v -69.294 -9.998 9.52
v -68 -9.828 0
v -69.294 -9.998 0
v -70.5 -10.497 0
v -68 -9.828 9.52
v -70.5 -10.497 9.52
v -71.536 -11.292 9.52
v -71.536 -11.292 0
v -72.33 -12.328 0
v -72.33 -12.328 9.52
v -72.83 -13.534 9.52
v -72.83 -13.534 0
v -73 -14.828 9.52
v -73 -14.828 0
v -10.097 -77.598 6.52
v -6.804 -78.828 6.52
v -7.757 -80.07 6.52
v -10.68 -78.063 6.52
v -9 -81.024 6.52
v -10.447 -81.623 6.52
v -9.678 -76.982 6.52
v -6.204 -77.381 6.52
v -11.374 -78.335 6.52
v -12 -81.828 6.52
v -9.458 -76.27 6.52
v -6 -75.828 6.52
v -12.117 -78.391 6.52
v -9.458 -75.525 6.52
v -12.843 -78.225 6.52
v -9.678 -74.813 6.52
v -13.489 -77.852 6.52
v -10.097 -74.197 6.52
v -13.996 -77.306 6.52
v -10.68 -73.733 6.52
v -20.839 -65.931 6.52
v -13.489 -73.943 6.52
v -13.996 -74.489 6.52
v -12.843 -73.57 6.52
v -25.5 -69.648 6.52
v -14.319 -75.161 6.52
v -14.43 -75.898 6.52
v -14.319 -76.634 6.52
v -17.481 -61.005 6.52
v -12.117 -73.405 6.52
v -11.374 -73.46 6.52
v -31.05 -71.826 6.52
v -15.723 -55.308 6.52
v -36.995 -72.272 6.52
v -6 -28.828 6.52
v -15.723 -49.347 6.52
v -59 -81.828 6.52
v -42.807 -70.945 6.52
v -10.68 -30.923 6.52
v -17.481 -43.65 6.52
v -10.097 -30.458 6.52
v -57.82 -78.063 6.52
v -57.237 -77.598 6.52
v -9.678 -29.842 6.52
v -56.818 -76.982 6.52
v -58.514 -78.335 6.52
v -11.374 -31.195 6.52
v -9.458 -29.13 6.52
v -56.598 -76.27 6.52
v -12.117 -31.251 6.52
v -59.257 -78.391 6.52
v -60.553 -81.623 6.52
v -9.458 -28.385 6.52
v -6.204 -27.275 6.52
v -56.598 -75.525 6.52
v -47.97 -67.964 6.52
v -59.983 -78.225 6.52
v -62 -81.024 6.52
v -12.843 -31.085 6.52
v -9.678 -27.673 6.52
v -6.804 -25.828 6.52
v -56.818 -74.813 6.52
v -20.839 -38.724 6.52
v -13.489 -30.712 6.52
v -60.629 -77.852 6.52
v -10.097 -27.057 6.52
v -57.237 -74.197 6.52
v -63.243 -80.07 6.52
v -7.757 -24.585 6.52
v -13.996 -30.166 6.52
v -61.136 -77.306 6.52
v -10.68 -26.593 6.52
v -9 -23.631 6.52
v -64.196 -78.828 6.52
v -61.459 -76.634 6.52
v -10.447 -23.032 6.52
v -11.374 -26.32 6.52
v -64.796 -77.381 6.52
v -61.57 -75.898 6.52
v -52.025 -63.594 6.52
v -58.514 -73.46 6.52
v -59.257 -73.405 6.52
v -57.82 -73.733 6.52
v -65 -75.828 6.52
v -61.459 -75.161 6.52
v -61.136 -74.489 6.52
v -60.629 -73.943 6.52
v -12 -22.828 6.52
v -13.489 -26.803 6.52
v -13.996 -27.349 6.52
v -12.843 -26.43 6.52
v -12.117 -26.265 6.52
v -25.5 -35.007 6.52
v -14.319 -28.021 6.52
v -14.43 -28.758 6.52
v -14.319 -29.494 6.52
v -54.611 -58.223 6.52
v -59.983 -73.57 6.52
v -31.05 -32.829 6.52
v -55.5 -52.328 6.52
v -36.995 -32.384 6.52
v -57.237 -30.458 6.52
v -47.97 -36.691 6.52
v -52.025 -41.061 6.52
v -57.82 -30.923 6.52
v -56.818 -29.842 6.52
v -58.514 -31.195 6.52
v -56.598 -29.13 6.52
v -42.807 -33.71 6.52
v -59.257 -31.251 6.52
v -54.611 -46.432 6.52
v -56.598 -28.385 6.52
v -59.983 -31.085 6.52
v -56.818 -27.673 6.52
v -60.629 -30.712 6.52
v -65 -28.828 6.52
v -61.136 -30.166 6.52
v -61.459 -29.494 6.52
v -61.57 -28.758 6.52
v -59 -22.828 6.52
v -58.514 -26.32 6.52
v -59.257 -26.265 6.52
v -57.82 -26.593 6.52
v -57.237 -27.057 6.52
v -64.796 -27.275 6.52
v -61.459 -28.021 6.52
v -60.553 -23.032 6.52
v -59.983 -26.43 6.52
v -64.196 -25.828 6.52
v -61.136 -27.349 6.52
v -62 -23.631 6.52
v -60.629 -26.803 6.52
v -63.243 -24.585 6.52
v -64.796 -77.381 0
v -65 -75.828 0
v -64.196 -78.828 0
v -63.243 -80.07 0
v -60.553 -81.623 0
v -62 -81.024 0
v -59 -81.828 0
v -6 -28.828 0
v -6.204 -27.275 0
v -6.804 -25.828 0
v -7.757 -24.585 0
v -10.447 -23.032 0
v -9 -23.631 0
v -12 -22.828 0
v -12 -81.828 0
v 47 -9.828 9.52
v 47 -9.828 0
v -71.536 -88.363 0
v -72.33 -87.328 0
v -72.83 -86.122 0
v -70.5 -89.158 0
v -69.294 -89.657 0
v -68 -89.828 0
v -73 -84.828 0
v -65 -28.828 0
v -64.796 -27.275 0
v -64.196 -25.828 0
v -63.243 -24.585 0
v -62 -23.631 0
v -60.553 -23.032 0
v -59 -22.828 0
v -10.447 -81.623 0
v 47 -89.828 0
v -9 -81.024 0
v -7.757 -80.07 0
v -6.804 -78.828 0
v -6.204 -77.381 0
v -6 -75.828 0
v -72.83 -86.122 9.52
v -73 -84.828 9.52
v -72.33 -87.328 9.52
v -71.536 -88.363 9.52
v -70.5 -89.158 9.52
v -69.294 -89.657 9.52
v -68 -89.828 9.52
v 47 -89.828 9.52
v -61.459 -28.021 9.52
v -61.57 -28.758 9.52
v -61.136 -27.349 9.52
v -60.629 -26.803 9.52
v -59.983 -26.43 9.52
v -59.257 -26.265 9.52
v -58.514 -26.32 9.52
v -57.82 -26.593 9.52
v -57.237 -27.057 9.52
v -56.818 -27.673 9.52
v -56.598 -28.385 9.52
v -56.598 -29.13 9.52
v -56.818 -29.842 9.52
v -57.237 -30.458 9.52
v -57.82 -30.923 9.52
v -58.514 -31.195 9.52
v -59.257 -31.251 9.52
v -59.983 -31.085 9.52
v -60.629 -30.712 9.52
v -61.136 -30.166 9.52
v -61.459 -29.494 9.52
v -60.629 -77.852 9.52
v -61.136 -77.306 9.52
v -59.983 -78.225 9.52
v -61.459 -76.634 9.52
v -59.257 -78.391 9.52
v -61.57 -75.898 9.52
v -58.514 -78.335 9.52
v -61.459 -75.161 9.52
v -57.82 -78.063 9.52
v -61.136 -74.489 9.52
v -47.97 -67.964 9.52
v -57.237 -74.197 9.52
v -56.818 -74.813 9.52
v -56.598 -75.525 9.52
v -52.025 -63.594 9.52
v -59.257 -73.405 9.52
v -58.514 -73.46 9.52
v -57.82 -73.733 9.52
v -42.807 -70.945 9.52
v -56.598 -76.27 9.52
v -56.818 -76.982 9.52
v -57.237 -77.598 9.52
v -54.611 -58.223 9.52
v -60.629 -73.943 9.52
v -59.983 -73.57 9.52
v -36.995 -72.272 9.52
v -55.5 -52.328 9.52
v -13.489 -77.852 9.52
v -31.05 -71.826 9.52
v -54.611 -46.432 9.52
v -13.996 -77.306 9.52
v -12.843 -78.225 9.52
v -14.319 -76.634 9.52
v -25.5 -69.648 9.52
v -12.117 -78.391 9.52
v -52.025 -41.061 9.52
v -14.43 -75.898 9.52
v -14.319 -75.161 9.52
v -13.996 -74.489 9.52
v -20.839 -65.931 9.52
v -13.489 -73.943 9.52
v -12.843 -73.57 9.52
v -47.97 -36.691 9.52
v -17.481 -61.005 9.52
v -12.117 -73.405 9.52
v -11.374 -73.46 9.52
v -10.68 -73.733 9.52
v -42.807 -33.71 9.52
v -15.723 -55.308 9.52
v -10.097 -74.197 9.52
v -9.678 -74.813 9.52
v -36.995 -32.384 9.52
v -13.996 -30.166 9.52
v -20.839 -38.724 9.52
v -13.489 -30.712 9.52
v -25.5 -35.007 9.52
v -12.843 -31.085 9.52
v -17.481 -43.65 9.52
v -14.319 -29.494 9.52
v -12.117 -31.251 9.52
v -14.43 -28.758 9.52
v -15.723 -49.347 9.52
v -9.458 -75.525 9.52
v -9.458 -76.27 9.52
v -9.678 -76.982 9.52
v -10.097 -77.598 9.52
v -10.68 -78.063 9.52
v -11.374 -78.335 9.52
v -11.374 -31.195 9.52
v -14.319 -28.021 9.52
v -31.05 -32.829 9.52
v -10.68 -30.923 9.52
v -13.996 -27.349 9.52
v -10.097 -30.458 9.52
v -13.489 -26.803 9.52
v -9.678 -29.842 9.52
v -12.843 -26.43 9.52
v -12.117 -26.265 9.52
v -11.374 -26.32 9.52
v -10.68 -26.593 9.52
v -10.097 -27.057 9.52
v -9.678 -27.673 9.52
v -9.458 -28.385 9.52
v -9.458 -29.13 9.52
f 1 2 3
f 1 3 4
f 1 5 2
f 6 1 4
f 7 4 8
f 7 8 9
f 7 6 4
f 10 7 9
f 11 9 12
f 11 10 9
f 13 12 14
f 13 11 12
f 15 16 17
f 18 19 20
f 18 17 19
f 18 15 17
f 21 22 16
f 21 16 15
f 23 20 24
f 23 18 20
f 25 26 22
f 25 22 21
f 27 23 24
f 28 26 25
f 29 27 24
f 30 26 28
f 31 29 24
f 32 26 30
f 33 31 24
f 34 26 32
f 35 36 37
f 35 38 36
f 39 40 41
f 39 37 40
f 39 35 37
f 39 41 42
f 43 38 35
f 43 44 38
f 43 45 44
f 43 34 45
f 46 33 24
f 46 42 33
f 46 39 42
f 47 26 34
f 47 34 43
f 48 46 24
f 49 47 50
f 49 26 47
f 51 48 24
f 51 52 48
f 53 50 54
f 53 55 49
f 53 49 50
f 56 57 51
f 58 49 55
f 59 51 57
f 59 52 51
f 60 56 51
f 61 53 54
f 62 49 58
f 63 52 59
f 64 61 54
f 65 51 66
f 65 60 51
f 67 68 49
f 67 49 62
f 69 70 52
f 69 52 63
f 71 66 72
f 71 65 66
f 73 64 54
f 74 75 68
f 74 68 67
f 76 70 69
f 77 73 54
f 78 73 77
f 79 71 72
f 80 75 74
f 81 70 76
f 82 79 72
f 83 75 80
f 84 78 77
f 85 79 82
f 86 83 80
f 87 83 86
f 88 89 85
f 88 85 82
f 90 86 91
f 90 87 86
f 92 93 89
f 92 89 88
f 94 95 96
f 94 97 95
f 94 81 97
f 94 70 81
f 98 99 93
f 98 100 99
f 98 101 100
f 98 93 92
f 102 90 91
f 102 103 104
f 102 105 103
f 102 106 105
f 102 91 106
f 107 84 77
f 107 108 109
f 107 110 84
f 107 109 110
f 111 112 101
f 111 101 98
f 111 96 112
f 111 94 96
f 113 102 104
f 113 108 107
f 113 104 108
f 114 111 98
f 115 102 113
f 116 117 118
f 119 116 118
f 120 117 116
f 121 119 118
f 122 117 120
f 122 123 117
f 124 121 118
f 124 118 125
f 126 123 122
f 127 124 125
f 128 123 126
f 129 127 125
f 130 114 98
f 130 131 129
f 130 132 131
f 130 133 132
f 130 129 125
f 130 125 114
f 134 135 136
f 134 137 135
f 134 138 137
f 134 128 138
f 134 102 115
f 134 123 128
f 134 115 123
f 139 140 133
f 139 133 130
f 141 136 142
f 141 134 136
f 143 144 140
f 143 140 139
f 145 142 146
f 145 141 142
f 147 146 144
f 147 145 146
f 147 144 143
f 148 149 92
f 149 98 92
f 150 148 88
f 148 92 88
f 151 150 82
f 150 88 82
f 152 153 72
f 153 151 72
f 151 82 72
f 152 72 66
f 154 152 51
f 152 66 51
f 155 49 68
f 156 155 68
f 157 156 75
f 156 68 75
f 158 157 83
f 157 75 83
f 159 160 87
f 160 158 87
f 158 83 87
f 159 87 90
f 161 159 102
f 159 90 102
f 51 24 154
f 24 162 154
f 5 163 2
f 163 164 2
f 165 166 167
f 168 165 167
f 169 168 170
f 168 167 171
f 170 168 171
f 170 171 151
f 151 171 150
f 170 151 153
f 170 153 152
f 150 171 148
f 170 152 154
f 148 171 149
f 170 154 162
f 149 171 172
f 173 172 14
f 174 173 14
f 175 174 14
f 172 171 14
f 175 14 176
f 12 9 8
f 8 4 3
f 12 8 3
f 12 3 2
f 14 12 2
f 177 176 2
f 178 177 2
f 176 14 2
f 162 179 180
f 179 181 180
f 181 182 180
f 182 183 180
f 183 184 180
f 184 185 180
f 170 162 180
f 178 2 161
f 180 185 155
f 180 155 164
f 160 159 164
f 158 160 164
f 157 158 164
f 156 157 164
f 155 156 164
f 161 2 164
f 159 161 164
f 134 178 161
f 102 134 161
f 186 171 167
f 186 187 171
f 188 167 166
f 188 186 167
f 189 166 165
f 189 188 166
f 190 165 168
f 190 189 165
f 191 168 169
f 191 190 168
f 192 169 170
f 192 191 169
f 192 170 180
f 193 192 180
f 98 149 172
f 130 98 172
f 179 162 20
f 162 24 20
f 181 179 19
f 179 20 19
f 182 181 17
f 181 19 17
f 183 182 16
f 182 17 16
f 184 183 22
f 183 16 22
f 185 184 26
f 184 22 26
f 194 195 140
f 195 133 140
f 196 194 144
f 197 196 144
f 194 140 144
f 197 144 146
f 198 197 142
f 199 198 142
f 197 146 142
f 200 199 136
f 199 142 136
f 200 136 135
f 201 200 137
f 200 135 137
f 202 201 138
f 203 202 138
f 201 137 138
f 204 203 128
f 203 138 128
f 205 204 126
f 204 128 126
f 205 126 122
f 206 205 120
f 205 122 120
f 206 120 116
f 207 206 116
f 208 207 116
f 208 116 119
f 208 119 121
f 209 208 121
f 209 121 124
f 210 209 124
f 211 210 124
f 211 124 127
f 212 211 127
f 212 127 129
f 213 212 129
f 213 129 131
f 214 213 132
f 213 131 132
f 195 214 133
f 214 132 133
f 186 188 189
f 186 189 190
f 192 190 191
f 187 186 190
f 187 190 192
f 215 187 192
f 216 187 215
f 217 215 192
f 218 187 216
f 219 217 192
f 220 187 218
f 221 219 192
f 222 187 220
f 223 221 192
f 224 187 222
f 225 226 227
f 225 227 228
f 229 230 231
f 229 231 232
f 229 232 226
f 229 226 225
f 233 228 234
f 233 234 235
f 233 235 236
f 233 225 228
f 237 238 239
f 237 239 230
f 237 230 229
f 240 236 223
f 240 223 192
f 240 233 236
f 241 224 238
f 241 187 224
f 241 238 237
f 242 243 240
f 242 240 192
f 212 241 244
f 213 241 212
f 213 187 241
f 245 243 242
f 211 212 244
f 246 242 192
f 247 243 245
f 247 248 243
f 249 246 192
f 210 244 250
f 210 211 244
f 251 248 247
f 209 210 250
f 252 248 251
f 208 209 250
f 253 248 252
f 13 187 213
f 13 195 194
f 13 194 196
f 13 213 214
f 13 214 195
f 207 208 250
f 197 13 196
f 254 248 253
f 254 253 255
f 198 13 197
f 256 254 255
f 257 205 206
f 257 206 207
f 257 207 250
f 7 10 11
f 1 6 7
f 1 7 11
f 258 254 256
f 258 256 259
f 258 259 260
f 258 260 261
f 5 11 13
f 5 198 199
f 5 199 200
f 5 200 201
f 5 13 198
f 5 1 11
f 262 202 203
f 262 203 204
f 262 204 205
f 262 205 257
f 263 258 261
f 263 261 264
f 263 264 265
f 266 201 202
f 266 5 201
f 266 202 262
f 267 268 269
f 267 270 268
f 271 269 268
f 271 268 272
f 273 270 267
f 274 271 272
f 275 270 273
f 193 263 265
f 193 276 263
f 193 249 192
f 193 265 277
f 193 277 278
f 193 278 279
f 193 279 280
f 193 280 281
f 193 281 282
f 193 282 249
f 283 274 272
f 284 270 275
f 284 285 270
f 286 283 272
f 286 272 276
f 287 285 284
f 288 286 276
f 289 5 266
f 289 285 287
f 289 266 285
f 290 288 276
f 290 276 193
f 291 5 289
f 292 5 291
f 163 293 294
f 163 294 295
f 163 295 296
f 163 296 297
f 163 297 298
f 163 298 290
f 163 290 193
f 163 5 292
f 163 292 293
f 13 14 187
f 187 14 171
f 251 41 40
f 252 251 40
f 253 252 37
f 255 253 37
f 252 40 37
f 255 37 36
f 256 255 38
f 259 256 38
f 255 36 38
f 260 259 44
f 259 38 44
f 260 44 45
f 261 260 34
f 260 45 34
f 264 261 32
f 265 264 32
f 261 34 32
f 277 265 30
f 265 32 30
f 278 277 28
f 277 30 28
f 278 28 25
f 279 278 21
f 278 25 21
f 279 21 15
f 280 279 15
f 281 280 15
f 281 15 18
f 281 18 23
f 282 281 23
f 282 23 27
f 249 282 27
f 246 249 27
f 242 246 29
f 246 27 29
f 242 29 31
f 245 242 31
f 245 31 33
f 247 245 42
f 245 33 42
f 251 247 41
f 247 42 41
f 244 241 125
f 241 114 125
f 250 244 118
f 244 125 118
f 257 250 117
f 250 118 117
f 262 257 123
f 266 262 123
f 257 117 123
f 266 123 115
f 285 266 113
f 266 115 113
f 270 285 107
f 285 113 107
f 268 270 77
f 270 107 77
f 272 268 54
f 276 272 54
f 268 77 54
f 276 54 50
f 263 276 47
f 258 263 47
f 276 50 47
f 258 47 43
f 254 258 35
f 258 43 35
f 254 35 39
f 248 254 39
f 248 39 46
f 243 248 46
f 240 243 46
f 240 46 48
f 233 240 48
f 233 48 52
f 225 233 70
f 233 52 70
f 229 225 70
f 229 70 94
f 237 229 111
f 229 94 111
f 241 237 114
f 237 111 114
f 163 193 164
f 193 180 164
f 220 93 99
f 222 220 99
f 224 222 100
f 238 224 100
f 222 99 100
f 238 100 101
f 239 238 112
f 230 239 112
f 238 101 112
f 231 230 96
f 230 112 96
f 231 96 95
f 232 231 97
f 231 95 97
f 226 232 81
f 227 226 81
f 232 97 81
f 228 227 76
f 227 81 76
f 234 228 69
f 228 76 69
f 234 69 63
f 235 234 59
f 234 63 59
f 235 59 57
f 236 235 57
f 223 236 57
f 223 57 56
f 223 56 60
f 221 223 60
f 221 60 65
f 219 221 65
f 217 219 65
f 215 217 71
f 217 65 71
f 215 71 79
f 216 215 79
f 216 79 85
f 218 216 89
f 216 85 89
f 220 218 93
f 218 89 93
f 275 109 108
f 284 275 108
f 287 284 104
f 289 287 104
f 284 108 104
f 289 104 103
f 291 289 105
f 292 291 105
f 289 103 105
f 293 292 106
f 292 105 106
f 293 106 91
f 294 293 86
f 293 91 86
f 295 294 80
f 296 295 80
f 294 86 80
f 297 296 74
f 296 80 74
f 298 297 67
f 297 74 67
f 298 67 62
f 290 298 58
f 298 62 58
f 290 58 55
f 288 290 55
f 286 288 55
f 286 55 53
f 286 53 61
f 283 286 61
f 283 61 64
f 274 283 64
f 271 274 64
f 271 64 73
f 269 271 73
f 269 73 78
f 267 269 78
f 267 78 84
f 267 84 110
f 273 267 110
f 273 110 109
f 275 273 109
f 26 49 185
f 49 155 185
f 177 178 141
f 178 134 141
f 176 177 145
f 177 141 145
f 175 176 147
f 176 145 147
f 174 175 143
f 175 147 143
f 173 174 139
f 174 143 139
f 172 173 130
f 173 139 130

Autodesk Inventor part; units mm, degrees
ref_plane "YZ Plane" through (0, 0, 0) normal (1, 0, 0) x (0, 1, 0)
ref_plane "XZ Plane" through (0, 0, 0) normal (0, 1, 0) x (-1, 0, 0)
ref_plane "XY Plane" through (0, 0, 0) normal (0, 0, 1) x (1, 0, 0)
sketch "Esboço1" plane through (0, 0, 0) normal (0, 0, 1) x (1, 0, 0)
  line L0 (-33, -50) -> (-33, 950) projected
  line L1 (47, -50) -> (47, 950) projected
  line L2 (-73, -89.8276) -> (47, -89.8276)
  line L3 (47, -9.8276) -> (-73, -9.8276)
  line L4 (-73, -9.8276) -> (-73, -89.8276)
  line L5 (47, -89.8276) -> (47, -9.8276)
  point P0 (0, 0)
  dimension "d0" = 120
  dimension "d1" = 120
  dimension "d2" = 80
extrude "Extrusão1" add sketch "Esboço1" along normal blind 9.52
sketch "Esboço9" plane through (0, 0, 0) normal (0, 0, -1) x (-1, 0, 0)
  line L0 (65, -22.8276) -> (6, -22.8276)
  line L1 (6, -22.8276) -> (6, -81.8276)
  line L2 (6, -81.8276) -> (65, -81.8276)
  line L3 (65, -81.8276) -> (65, -22.8276)
  line L4 (65, -22.8276) -> (6, -81.8276) construction
  line L5 (6, -22.8276) -> (65, -81.8276) construction
  line L6 (65, -52.3276) -> (6, -52.3276) construction
  line L7 (35.5, -22.8276) -> (35.5, -81.8276) construction
  circle A0 centre (59.07, -28.7576) radius 2.5
  circle A1 centre (59.07, -75.8976) radius 2.5
  circle A2 centre (11.93, -28.7576) radius 2.5
  circle A3 centre (11.93, -75.8976) radius 2.5
  line L8 (73, -9.8276) -> (73, -89.8276) projected
  line L9 (73, -89.8276) -> (-47, -89.8276) projected
  circle A4 centre (35.5, -52.3276) radius 20
  point P0 (0, 0)
  dimension "d72" = 59
  dimension "d73" = 59
  dimension "d74" = 5
  dimension "d75" = 5
  dimension "d76" = 5
  dimension "d77" = 5
  dimension "d78" = 23.57
  dimension "d79" = 23.57
  dimension "d80" = 23.57
  dimension "d81" = 23.57
  dimension "d82" = 23.57
  dimension "d83" = 23.57
  dimension "d84" = 23.57
  dimension "d85" = 23.57
  dimension "d86" = 8
  dimension "d87" = 8
  dimension "d88" = 40
extrude "Extrusão6" cut sketch "Esboço9" against normal blind 6.52
sketch "Esboço10" plane through (-35.5, -52.3276, 0) normal (0, 0, -1) x (-1, 0, 0)
  circle A0 centre (0, 0) radius 20 projected
  circle A1 centre (0, 0) radius 20
  circle A2 centre (23.57, -23.57) radius 2.5 projected
  circle A3 centre (23.57, -23.57) radius 2.5
  circle A4 centre (23.57, 23.57) radius 2.5 projected
  circle A5 centre (23.57, 23.57) radius 2.5
  circle A6 centre (-23.57, 23.57) radius 2.5 projected
  circle A7 centre (-23.57, 23.57) radius 2.5
  circle A8 centre (-23.57, -23.57) radius 2.5 projected
  circle A9 centre (-23.57, -23.57) radius 2.5
  point P0 (-35.5, 52.3276)
extrude "Extrusão7" cut sketch "Esboço10" against normal through all
fillet "Arredondamento1" radius 6 4 edges at (-65, -22.8276, 3.26) (-65, -81.8276, 3.26) (-6, -22.8276, 3.26) (-6, -81.8276, 3.26)
fillet "Arredondamento2" radius 5 2 edges at (-73, -9.8276, 4.76) (-73, -89.8276, 4.76)
equation "\"d0\" = d1"
equation "\"d79\" = d78"
equation "\"d80\" = d78"
equation "\"d81\" = d78"
equation "\"d82\" = d78"
equation "\"d83\" = d78"
equation "\"d84\" = d78"
equation "\"d85\" = d78"
properties part number "SUPORTE_MOTOR_EIXO_Y_1"
